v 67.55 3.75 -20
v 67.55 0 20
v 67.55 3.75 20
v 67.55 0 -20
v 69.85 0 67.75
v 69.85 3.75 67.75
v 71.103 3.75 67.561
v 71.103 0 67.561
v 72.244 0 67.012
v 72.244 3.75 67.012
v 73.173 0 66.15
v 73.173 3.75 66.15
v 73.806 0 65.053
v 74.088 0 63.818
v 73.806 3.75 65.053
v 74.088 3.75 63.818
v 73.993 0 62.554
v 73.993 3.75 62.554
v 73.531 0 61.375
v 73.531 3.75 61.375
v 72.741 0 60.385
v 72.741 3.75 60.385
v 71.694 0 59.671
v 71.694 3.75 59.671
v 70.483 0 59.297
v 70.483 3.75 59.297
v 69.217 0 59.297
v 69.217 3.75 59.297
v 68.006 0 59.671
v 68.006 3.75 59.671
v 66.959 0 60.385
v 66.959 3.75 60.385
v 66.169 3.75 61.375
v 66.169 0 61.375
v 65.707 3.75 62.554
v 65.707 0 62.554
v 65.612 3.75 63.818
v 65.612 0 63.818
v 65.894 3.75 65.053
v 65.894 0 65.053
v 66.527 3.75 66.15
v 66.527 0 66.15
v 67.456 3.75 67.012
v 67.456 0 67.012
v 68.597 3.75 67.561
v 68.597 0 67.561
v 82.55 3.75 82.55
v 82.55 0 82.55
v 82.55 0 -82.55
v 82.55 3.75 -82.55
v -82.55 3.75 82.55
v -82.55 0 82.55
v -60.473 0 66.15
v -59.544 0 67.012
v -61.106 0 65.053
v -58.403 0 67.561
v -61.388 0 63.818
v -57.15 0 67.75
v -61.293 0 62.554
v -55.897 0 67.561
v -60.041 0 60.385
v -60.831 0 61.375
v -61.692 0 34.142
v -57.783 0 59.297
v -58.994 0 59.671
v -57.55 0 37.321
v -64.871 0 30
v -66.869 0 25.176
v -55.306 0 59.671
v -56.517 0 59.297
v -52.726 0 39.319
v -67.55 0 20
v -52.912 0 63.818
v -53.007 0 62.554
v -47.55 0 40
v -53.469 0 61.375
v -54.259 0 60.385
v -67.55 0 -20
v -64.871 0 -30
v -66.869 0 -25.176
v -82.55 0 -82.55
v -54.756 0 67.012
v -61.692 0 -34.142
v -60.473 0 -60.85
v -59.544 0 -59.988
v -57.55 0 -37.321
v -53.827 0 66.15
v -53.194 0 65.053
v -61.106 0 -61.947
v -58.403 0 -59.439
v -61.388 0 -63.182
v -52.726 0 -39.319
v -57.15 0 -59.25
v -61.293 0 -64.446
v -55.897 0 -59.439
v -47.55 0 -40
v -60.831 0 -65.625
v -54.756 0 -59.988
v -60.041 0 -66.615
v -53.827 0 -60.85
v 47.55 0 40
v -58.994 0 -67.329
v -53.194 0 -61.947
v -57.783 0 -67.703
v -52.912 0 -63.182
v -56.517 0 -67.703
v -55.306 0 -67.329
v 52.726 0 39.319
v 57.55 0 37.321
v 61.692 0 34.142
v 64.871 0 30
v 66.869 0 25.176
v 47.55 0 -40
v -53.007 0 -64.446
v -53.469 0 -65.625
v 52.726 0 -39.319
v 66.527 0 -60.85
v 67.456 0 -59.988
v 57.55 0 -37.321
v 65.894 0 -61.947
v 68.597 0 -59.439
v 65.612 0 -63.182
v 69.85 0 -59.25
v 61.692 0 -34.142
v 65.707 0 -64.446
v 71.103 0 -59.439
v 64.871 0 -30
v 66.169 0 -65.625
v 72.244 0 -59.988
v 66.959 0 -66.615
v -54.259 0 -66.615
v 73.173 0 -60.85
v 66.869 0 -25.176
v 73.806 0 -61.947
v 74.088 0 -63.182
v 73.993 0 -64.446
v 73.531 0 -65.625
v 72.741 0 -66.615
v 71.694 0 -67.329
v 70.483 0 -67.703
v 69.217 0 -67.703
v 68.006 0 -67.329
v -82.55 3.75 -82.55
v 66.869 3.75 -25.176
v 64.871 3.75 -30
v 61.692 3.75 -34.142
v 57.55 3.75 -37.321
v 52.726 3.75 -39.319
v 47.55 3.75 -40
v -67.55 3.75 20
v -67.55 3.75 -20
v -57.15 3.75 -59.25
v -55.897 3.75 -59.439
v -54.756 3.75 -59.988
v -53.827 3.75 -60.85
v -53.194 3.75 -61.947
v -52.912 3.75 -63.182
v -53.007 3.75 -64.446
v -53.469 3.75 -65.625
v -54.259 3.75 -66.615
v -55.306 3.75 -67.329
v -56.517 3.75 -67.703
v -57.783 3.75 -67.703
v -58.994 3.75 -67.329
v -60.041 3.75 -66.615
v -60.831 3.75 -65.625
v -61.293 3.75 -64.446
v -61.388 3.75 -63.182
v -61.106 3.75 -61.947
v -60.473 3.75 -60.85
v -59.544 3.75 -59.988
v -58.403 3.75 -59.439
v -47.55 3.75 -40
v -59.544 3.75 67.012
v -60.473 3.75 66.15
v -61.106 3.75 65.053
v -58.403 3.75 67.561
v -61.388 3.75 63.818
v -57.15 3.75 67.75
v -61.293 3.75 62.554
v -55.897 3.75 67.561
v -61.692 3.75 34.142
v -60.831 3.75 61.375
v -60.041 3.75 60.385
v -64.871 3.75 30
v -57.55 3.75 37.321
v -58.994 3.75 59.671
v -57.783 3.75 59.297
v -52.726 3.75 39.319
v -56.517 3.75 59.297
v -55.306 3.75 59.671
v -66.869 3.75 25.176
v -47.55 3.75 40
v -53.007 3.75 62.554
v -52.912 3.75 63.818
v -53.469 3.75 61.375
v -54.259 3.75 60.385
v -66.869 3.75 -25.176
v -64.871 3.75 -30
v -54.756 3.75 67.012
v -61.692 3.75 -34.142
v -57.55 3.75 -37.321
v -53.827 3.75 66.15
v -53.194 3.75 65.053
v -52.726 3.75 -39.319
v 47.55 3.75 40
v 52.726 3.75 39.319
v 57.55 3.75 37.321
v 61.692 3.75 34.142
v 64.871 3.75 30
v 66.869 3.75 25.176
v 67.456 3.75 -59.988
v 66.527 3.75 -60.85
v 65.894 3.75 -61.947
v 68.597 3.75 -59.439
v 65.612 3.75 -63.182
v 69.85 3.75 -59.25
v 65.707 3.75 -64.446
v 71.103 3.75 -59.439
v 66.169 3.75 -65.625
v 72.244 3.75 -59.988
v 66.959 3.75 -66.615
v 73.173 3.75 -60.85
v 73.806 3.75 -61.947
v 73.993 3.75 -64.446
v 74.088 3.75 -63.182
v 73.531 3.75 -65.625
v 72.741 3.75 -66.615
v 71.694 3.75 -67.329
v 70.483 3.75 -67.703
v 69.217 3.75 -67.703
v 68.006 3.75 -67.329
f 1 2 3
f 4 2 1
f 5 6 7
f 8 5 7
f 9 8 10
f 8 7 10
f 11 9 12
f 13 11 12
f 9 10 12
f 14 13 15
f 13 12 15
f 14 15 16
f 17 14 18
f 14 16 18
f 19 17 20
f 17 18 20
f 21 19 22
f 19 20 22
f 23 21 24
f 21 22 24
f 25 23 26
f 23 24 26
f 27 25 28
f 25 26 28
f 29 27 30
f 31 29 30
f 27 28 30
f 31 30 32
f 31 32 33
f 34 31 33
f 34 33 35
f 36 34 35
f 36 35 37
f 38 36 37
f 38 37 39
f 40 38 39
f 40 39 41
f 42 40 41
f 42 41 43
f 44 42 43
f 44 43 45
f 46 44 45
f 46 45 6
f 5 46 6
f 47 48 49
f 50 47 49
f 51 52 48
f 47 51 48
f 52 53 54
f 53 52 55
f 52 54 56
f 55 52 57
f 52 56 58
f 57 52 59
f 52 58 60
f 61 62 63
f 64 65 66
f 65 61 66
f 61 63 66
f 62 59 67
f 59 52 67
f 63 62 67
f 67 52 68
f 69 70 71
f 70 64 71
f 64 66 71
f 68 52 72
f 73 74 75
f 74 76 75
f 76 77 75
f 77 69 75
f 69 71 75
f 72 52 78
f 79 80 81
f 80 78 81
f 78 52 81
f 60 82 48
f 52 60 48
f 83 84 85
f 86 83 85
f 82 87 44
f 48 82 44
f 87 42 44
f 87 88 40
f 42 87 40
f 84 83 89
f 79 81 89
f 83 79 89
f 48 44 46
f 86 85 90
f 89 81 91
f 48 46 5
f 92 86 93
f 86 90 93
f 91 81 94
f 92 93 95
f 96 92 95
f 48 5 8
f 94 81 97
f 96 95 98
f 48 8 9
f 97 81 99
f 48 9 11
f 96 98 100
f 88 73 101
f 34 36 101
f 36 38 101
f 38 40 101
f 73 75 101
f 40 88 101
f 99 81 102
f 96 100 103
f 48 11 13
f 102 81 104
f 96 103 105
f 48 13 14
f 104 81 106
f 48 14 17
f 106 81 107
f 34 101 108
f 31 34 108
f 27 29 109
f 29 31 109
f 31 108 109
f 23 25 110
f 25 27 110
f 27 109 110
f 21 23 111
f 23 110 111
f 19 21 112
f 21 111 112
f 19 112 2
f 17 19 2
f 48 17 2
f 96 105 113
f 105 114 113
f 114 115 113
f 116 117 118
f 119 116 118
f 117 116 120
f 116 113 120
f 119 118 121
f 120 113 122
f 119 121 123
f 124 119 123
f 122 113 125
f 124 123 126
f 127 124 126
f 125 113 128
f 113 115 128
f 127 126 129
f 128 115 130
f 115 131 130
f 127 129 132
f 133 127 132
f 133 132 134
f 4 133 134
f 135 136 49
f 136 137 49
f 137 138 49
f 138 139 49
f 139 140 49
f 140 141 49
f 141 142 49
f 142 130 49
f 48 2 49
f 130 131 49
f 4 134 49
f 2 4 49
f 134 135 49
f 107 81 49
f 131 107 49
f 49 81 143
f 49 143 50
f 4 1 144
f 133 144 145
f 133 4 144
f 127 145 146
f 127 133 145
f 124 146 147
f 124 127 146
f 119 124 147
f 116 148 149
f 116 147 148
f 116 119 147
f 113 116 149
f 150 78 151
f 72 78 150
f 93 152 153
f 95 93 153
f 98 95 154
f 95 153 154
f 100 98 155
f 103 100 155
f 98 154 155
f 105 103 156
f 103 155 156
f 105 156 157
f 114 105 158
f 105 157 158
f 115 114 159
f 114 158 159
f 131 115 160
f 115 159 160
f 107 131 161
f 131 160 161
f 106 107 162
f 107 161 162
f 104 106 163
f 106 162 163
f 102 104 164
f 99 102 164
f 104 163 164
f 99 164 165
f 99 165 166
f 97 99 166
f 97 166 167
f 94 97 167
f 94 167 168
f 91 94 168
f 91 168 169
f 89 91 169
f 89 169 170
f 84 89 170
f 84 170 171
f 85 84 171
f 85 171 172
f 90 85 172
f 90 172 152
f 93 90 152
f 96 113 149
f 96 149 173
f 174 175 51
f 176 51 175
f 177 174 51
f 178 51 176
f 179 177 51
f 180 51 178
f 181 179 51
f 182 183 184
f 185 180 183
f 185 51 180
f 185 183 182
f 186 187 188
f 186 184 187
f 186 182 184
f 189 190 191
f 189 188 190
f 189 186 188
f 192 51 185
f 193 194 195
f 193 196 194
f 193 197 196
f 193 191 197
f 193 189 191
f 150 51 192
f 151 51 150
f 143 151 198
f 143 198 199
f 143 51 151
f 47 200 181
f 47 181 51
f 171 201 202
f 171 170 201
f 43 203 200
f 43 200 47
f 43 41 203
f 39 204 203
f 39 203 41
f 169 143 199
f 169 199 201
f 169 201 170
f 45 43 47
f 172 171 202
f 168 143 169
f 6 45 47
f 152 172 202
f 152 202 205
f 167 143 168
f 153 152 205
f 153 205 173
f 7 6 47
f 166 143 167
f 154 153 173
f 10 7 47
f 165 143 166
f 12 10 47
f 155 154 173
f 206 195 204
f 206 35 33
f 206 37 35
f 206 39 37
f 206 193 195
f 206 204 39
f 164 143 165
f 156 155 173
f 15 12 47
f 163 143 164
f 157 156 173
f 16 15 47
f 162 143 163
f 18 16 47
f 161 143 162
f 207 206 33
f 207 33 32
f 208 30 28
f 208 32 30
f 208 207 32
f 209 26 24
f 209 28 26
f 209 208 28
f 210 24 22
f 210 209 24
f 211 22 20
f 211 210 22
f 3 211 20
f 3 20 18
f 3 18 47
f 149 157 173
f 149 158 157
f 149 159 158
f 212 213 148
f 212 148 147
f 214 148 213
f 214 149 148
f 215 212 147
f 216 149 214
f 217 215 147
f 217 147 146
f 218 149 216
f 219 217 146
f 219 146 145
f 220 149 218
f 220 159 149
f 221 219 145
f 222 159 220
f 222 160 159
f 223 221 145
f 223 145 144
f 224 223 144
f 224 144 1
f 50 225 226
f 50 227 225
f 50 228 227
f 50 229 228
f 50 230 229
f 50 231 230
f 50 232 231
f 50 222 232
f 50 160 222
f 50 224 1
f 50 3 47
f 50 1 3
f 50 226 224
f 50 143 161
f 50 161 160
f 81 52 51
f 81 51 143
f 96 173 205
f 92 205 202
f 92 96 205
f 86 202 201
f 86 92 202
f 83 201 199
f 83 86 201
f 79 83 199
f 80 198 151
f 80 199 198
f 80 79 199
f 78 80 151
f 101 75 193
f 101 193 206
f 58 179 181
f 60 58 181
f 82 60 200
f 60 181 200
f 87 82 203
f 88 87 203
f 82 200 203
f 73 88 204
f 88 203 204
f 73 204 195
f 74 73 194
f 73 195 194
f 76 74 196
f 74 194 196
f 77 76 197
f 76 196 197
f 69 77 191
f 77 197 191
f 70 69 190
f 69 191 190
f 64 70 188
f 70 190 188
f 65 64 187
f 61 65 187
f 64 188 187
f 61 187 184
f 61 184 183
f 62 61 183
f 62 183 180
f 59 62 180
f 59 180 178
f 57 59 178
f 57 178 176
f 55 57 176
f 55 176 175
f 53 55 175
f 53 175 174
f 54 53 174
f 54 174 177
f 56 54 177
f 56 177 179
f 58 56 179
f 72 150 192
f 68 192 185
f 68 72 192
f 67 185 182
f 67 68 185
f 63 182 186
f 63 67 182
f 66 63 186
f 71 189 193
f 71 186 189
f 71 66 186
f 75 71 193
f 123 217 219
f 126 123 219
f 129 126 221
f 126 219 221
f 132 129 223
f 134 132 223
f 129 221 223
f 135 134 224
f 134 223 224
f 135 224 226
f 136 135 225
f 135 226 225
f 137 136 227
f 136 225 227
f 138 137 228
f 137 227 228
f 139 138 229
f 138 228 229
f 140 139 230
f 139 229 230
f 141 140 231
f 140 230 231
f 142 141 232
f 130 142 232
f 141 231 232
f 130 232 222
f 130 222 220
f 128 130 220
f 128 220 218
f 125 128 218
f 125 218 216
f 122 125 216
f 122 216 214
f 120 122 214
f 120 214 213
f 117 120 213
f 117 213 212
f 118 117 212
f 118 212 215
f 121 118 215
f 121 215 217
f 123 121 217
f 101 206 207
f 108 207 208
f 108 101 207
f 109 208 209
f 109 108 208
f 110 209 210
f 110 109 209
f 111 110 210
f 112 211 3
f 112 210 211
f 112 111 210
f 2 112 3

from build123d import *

# Parameters (mm, degrees)
SKETCH1_W           = 165.1
SKETCH1_H           = 165.1
BOSS_EXTRUDE1_DEPTH = 3.75
CUT_EXTRUDE1_REACH  = 118.804
SKETCH2_R           = 4.25
CUT_EXTRUDE2_REACH  = 118.804


with BuildPart() as part:
    # Sketch1 → Boss-Extrude1 (new body)
    with BuildSketch(Plane(origin=(0, 0, 0), x_dir=(1, 0, 0), z_dir=(0, 1, 0))):
        Rectangle(SKETCH1_W, SKETCH1_H)
    extrude(amount=BOSS_EXTRUDE1_DEPTH)

    # Sketch2 → Cut-Extrude1 (cut, up to next)
    with BuildSketch(Plane(origin=(0, 3.75, 0), x_dir=(1, 0, 0), z_dir=(0, 1, 0)), mode=Mode.PRIVATE) as cut_extrude1_sk1:
        with Locations(Location((69.85, 63.5, 0), (0, 0, 270))):
            Circle(SKETCH2_R)
    cut_extrude1_tool1 = extrude(cut_extrude1_sk1.sketch, amount=-CUT_EXTRUDE1_REACH, mode=Mode.PRIVATE) & part.part
    # Sketch2 → Cut-Extrude1 (cut, up to next)
    with BuildSketch(Plane(origin=(0, 3.75, 0), x_dir=(1, 0, 0), z_dir=(0, 1, 0)), mode=Mode.PRIVATE) as cut_extrude1_sk2:
        with Locations(Location((-57.15, 63.5, 0), (0, 0, 270))):
            Circle(SKETCH2_R)
    cut_extrude1_tool2 = extrude(cut_extrude1_sk2.sketch, amount=-CUT_EXTRUDE1_REACH, mode=Mode.PRIVATE) & part.part
    # Sketch2 → Cut-Extrude1 (cut, up to next)
    with BuildSketch(Plane(origin=(0, 3.75, 0), x_dir=(1, 0, 0), z_dir=(0, 1, 0)), mode=Mode.PRIVATE) as cut_extrude1_sk3:
        with Locations(Location((-57.15, -63.5, 0), (0, 0, 270))):
            Circle(SKETCH2_R)
    cut_extrude1_tool3 = extrude(cut_extrude1_sk3.sketch, amount=-CUT_EXTRUDE1_REACH, mode=Mode.PRIVATE) & part.part
    # Sketch2 → Cut-Extrude1 (cut, up to next)
    with BuildSketch(Plane(origin=(0, 3.75, 0), x_dir=(1, 0, 0), z_dir=(0, 1, 0)), mode=Mode.PRIVATE) as cut_extrude1_sk4:
        with Locations(Location((69.85, -63.5, 0), (0, 0, 270))):
            Circle(SKETCH2_R)
    cut_extrude1_tool4 = extrude(cut_extrude1_sk4.sketch, amount=-CUT_EXTRUDE1_REACH, mode=Mode.PRIVATE) & part.part
    add(cut_extrude1_tool1.solids().sort_by_distance((69.85, 3.75, -63.5))[0], mode=Mode.SUBTRACT)
    add(cut_extrude1_tool2.solids().sort_by_distance((-57.15, 3.75, -63.5))[0], mode=Mode.SUBTRACT)
    add(cut_extrude1_tool3.solids().sort_by_distance((-57.15, 3.75, 63.5))[0], mode=Mode.SUBTRACT)
    add(cut_extrude1_tool4.solids().sort_by_distance((69.85, 3.75, 63.5))[0], mode=Mode.SUBTRACT)

    # Sketch3 → Cut-Extrude2 (cut, up to next)
    with BuildSketch(Plane.XZ, mode=Mode.PRIVATE) as cut_extrude2_sk1:
        with BuildLine():
            Line((-67.55, -20), (-67.55, 20))
            ThreePointArc((-67.55, 20), (-61.692135624, 34.142135624), (-47.55, 40))
            Line((-47.55, 40), (47.55, 40))
            ThreePointArc((47.55, 40), (61.692135624, 34.142135624), (67.55, 20))
            Line((67.55, 20), (67.55, -20))
            ThreePointArc((67.55, -20), (61.692135624, -34.142135624), (47.55, -40))
            Line((47.55, -40), (-47.55, -40))
            ThreePointArc((-47.55, -40), (-61.692135624, -34.142135624), (-67.55, -20))
        make_face()
    cut_extrude2_tool1 = extrude(cut_extrude2_sk1.sketch, amount=-CUT_EXTRUDE2_REACH, mode=Mode.PRIVATE) & part.part
    add(cut_extrude2_tool1.solids().sort_by_distance((0, 0, 0))[0], mode=Mode.SUBTRACT)


solid = part.part
